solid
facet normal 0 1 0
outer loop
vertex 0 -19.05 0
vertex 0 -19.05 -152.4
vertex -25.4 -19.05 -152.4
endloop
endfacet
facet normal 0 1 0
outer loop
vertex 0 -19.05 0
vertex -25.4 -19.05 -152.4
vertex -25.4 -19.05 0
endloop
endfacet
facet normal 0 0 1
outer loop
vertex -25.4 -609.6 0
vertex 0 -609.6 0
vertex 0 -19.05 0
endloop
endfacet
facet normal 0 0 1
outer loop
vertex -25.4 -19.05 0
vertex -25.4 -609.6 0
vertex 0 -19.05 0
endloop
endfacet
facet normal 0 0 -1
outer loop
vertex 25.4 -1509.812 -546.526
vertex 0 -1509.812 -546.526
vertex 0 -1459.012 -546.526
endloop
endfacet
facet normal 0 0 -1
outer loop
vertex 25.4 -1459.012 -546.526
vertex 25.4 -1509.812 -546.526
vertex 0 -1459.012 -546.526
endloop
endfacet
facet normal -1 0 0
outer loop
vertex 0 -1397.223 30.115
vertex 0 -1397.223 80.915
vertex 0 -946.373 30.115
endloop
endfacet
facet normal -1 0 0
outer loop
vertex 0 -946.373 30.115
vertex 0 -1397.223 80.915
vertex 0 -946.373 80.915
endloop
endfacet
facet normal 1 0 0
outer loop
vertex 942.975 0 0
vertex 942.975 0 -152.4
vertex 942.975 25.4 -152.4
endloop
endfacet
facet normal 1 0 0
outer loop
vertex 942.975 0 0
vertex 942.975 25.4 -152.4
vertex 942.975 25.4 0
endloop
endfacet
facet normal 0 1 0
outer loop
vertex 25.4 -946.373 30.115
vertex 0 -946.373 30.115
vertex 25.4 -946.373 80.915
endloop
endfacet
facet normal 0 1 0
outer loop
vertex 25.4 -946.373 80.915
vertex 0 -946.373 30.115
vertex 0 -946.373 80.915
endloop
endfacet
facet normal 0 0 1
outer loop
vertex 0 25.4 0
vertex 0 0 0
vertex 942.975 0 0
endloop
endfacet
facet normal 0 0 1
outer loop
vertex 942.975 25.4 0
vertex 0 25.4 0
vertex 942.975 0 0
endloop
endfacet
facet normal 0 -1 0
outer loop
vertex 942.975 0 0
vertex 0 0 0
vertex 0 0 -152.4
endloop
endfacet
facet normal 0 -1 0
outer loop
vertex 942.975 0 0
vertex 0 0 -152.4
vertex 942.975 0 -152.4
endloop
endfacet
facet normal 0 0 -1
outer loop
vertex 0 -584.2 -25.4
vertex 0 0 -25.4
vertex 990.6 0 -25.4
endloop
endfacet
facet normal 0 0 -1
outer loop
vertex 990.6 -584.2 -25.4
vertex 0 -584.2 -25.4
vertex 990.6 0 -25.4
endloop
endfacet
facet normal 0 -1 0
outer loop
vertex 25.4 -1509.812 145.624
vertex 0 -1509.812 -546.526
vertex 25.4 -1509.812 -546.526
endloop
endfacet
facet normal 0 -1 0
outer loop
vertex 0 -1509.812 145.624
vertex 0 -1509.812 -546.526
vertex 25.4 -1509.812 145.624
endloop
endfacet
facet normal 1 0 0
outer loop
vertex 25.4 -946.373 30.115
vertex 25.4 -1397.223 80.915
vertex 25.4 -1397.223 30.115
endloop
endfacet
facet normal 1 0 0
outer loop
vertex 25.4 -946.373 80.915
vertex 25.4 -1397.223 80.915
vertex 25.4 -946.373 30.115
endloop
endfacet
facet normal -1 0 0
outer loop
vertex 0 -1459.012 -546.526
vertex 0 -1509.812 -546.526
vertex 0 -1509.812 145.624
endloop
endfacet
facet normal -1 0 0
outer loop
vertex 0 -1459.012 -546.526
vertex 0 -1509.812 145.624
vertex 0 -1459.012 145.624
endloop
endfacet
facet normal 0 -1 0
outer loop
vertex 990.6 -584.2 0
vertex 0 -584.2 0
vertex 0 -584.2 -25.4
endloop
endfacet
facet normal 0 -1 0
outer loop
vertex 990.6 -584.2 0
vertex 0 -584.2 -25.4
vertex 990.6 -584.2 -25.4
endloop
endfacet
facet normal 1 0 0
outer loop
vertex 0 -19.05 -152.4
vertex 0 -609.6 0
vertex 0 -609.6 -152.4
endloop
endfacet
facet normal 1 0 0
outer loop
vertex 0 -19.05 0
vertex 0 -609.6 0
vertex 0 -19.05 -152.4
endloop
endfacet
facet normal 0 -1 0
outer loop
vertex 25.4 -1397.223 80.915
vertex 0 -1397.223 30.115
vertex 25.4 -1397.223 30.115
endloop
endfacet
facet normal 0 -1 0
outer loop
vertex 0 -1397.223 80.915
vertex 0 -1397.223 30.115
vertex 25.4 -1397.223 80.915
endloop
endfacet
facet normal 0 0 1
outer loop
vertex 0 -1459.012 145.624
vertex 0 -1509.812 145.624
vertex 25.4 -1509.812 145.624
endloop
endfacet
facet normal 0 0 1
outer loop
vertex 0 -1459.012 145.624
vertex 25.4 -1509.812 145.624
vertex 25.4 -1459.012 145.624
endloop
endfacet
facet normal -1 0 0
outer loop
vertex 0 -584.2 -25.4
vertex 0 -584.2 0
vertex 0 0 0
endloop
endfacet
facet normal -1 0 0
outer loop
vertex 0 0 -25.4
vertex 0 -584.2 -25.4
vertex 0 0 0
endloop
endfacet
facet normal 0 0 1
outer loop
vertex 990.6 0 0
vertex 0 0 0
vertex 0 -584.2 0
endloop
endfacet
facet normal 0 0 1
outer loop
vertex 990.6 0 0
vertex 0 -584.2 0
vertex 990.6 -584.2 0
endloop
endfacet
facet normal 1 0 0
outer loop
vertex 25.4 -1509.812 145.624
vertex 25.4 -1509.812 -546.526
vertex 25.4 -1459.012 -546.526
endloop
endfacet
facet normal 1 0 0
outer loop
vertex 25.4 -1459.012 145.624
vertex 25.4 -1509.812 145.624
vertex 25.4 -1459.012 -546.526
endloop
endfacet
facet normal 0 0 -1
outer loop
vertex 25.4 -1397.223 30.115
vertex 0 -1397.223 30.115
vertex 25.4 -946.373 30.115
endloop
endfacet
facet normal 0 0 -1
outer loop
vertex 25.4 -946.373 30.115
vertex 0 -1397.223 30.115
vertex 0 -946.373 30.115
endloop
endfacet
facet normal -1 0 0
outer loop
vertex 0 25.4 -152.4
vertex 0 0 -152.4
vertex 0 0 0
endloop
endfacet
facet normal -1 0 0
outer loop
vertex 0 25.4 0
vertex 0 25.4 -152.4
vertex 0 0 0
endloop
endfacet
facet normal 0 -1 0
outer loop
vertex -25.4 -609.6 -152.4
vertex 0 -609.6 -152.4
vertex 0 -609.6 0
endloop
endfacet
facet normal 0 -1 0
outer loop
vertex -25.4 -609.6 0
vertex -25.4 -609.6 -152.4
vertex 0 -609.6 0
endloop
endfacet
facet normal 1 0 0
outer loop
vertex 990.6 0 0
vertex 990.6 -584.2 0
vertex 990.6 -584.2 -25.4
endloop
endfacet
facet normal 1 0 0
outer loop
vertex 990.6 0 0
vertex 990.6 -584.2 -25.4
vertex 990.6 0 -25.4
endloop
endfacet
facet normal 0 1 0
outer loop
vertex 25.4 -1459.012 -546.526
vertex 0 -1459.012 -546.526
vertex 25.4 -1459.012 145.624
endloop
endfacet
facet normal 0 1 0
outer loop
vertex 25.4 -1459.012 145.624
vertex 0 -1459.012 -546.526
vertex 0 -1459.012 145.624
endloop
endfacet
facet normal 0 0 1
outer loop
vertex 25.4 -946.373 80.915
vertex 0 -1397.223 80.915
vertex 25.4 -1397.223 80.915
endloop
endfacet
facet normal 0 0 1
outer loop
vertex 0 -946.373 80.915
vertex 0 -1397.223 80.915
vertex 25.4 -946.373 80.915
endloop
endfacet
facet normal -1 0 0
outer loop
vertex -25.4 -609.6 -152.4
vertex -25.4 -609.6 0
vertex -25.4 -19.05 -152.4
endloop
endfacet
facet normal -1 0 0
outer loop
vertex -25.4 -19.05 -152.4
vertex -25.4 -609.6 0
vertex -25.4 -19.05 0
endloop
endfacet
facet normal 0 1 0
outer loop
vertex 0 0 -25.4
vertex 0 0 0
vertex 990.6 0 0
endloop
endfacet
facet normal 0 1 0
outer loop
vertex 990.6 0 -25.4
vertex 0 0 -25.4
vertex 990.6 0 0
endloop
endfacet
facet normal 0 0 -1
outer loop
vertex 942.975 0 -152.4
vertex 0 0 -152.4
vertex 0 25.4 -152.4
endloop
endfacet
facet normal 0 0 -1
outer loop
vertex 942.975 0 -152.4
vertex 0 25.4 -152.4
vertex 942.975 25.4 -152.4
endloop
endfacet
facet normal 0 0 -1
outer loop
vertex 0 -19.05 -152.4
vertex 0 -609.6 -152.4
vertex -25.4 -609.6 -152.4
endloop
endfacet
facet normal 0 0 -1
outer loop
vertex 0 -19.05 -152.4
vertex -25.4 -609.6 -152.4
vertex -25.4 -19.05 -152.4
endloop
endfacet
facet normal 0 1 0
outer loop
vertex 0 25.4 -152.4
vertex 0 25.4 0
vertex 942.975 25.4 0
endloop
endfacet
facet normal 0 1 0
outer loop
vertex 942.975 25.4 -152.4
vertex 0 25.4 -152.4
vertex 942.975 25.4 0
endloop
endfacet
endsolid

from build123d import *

# Parameters (mm, degrees)
F1_W     = 942.975
F1_H     = 152.4
F3_DEPTH = 25.4
F0_W     = 990.6
F0_H     = 584.2
F4_DEPTH = 25.4
F2_W     = 590.55
F2_H     = 152.4
F5_DEPTH = 25.4
F6_W     = 50.8
F6_H     = 692.15
F7_DEPTH = 25.4
F8_W     = 450.85
F8_H     = 50.8
F9_DEPTH = 25.4


with BuildPart() as f3:
    # F1 (on Front) → F3 (new body)
    with BuildSketch(Plane.XZ):
        with Locations((471.4875, -76.2)):
            Rectangle(F1_W, F1_H)
    extrude(amount=-F3_DEPTH)


with BuildPart() as f4:
    # F0 (on Top) → F4 (new body)
    with BuildSketch(Plane.XY):
        with Locations((495.3, -292.1)):
            Rectangle(F0_W, F0_H)
    extrude(amount=-F4_DEPTH)


with BuildPart() as f5:
    # F2 (on Right) → F5 (new body)
    with BuildSketch(Plane.YZ):
        with Locations((-314.325468, -76.2)):
            Rectangle(F2_W, F2_H)
    extrude(amount=-F5_DEPTH)


with BuildPart() as f7:
    # F6 (on Right) → F7 (new body)
    with BuildSketch(Plane.YZ):
        with Locations((-1484.41227, -200.450538)):
            Rectangle(F6_W, F6_H)
    extrude(amount=F7_DEPTH)


with BuildPart() as f9:
    # F8 (on Right) → F9 (new body)
    with BuildSketch(Plane.YZ):
        with Locations((-1171.798237, 55.515485)):
            Rectangle(F8_W, F8_H)
    extrude(amount=F9_DEPTH)


solid = Compound([f3.part, f4.part, f5.part, f7.part, f9.part])
